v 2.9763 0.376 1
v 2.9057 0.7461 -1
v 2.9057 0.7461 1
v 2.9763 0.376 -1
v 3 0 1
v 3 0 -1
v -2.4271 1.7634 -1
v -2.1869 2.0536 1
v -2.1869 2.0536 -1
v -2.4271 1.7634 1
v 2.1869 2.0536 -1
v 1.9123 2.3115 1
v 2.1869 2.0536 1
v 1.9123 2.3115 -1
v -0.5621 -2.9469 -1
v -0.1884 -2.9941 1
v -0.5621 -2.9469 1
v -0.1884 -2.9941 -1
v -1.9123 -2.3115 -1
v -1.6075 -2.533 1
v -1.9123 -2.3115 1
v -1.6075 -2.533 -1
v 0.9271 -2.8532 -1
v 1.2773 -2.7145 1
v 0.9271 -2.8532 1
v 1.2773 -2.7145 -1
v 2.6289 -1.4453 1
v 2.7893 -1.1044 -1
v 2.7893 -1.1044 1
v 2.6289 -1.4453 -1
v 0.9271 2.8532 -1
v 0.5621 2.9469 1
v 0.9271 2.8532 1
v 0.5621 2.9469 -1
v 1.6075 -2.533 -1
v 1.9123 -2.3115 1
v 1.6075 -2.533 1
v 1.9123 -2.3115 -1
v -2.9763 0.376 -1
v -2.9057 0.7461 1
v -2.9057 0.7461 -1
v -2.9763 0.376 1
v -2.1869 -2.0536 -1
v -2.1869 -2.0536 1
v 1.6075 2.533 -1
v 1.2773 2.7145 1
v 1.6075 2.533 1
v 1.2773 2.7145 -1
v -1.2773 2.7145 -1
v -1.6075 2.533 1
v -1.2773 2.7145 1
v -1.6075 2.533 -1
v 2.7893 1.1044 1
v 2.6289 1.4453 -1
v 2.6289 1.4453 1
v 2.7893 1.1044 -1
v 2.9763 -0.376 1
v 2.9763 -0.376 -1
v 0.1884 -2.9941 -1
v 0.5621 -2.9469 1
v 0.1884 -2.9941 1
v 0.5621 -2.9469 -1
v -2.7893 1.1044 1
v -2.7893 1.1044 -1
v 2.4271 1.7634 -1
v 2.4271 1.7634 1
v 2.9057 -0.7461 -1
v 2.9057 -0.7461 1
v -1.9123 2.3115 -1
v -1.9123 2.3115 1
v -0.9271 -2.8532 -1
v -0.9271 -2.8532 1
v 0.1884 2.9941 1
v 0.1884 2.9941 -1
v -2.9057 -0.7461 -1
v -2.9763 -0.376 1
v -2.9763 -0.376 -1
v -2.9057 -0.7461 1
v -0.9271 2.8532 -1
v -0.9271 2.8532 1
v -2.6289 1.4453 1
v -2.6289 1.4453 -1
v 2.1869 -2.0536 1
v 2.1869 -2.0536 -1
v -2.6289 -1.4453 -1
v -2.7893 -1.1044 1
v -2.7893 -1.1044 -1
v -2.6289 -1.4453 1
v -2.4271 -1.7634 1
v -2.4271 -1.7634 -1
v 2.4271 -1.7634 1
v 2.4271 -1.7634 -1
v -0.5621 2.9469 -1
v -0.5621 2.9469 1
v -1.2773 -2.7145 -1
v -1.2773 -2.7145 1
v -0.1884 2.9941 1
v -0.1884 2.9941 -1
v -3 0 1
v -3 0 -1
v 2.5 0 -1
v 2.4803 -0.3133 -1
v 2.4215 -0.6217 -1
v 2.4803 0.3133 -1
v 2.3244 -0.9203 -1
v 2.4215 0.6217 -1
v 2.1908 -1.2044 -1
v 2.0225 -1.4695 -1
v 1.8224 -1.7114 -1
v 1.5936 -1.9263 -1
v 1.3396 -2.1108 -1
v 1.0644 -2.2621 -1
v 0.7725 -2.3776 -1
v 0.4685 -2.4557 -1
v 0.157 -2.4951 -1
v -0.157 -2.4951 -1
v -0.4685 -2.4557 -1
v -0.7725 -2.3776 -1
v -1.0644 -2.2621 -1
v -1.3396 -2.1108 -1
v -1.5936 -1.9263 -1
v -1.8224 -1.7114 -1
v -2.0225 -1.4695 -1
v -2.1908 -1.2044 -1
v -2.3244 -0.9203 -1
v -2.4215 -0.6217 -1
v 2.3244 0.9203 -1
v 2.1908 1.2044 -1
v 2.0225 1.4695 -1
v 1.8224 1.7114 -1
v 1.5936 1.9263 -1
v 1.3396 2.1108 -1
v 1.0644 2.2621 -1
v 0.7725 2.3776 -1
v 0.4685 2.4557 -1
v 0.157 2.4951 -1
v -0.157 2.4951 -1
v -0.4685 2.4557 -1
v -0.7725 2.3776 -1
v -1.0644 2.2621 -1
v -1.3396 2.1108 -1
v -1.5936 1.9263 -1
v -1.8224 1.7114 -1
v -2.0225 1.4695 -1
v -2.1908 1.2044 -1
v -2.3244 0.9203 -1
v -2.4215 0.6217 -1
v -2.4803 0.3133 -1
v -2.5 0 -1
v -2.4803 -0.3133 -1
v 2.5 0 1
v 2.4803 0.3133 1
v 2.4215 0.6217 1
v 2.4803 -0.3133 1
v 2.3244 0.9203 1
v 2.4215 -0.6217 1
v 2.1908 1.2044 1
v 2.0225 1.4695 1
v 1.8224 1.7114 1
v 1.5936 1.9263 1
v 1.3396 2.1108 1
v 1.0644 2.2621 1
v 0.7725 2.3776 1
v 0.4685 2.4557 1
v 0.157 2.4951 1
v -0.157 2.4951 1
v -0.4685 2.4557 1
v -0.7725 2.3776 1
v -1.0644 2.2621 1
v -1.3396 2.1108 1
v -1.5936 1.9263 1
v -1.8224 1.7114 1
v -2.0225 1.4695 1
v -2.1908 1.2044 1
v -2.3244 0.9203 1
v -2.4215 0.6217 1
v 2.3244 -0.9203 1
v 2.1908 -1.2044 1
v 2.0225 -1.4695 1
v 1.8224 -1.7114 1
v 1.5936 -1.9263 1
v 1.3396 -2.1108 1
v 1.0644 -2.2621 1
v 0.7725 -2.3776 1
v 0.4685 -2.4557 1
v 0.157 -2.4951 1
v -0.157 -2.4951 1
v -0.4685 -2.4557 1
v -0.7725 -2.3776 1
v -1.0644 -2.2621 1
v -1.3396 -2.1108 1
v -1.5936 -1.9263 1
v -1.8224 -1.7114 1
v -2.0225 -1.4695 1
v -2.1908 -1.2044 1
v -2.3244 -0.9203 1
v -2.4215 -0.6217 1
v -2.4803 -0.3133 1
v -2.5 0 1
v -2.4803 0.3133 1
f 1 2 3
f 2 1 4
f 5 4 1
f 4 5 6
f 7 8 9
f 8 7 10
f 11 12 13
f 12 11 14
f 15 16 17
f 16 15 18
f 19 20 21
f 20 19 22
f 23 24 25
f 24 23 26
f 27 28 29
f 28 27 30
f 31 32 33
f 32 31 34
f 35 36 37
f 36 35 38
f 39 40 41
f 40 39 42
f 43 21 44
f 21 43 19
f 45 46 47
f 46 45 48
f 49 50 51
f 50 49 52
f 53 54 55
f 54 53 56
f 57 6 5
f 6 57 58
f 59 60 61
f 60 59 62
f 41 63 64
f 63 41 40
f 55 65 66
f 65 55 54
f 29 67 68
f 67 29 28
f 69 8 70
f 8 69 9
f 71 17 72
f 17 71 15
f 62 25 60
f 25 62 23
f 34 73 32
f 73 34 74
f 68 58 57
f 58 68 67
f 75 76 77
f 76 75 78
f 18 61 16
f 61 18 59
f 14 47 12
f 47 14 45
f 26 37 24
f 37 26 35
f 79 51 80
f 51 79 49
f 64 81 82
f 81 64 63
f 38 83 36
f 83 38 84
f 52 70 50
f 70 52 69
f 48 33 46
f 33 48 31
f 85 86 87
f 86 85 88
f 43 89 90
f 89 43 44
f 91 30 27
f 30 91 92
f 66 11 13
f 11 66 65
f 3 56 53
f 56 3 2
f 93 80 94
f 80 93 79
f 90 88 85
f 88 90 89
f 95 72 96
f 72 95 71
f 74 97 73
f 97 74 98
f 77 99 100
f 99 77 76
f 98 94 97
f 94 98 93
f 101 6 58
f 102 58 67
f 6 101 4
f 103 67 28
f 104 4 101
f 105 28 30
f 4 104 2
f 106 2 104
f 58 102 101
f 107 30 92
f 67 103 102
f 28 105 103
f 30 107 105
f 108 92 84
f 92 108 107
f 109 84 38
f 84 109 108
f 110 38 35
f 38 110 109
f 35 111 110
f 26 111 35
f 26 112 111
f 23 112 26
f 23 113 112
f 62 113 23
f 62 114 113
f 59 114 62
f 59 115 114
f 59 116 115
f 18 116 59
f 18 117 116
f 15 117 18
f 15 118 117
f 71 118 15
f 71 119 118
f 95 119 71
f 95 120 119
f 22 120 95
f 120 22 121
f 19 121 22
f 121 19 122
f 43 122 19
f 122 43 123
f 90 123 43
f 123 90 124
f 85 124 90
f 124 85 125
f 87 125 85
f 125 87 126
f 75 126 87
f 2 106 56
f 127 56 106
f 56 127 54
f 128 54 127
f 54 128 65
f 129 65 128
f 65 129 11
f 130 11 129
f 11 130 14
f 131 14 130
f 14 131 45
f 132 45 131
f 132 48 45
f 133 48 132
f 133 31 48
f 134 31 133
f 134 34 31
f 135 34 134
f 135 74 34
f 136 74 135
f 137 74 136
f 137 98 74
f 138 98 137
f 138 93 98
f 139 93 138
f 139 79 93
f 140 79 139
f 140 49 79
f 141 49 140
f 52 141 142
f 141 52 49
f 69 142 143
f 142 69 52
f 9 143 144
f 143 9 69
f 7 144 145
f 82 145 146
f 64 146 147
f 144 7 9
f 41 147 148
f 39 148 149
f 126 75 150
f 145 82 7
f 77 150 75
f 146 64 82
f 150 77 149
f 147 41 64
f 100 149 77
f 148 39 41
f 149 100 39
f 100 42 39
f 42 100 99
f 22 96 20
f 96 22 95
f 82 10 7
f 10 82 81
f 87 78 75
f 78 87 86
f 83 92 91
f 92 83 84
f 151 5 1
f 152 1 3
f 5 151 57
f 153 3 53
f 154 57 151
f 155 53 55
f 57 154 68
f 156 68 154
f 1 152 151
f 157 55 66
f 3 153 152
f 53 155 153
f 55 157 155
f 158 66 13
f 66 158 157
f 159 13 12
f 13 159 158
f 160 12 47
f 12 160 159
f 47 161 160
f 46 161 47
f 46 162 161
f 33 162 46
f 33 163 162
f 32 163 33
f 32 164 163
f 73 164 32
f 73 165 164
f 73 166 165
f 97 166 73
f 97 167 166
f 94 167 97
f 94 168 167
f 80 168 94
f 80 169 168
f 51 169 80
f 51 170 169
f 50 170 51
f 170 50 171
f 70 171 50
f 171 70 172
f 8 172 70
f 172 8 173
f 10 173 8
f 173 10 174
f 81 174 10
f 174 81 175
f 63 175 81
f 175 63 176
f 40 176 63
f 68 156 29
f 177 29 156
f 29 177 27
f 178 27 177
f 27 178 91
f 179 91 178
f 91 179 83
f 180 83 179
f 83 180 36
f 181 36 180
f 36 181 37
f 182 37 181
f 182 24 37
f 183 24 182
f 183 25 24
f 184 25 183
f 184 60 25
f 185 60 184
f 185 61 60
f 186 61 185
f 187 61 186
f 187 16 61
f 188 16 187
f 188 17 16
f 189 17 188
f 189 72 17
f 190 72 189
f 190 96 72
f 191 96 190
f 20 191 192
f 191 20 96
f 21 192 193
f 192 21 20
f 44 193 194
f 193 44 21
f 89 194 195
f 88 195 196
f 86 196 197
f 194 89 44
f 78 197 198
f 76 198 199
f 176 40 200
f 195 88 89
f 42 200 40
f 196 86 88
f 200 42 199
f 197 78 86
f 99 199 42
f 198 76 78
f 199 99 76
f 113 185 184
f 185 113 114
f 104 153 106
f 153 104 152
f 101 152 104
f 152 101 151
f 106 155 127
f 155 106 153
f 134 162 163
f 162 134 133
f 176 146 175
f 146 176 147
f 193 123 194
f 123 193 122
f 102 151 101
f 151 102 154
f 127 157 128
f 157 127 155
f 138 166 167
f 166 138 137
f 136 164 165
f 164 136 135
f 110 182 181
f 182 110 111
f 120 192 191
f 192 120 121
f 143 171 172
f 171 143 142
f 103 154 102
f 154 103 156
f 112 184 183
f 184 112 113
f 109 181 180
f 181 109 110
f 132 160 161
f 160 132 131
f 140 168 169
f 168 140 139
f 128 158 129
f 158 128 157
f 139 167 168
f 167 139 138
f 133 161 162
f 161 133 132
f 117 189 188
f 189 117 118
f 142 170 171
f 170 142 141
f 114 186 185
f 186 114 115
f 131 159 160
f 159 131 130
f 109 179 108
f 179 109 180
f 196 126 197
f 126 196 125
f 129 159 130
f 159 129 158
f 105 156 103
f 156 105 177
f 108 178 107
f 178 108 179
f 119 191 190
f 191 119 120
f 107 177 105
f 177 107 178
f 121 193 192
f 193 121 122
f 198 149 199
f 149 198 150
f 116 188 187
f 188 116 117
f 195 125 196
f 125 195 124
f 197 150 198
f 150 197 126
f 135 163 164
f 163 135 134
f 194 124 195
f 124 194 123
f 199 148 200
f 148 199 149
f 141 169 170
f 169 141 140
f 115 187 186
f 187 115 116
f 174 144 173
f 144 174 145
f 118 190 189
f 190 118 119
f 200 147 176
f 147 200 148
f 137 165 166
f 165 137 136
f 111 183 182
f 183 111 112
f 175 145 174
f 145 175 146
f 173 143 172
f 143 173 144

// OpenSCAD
$fn = 50;


difference() {
	union() {
		translate(v = [0, 0, -1.0000000000]) {
			cylinder(h = 2, r = 3.0000000000);
		}
	}
	union() {
		translate(v = [0, 0, -100.0000000000]) {
			cylinder(h = 200, r = 2.5000000000);
		}
	}
}
